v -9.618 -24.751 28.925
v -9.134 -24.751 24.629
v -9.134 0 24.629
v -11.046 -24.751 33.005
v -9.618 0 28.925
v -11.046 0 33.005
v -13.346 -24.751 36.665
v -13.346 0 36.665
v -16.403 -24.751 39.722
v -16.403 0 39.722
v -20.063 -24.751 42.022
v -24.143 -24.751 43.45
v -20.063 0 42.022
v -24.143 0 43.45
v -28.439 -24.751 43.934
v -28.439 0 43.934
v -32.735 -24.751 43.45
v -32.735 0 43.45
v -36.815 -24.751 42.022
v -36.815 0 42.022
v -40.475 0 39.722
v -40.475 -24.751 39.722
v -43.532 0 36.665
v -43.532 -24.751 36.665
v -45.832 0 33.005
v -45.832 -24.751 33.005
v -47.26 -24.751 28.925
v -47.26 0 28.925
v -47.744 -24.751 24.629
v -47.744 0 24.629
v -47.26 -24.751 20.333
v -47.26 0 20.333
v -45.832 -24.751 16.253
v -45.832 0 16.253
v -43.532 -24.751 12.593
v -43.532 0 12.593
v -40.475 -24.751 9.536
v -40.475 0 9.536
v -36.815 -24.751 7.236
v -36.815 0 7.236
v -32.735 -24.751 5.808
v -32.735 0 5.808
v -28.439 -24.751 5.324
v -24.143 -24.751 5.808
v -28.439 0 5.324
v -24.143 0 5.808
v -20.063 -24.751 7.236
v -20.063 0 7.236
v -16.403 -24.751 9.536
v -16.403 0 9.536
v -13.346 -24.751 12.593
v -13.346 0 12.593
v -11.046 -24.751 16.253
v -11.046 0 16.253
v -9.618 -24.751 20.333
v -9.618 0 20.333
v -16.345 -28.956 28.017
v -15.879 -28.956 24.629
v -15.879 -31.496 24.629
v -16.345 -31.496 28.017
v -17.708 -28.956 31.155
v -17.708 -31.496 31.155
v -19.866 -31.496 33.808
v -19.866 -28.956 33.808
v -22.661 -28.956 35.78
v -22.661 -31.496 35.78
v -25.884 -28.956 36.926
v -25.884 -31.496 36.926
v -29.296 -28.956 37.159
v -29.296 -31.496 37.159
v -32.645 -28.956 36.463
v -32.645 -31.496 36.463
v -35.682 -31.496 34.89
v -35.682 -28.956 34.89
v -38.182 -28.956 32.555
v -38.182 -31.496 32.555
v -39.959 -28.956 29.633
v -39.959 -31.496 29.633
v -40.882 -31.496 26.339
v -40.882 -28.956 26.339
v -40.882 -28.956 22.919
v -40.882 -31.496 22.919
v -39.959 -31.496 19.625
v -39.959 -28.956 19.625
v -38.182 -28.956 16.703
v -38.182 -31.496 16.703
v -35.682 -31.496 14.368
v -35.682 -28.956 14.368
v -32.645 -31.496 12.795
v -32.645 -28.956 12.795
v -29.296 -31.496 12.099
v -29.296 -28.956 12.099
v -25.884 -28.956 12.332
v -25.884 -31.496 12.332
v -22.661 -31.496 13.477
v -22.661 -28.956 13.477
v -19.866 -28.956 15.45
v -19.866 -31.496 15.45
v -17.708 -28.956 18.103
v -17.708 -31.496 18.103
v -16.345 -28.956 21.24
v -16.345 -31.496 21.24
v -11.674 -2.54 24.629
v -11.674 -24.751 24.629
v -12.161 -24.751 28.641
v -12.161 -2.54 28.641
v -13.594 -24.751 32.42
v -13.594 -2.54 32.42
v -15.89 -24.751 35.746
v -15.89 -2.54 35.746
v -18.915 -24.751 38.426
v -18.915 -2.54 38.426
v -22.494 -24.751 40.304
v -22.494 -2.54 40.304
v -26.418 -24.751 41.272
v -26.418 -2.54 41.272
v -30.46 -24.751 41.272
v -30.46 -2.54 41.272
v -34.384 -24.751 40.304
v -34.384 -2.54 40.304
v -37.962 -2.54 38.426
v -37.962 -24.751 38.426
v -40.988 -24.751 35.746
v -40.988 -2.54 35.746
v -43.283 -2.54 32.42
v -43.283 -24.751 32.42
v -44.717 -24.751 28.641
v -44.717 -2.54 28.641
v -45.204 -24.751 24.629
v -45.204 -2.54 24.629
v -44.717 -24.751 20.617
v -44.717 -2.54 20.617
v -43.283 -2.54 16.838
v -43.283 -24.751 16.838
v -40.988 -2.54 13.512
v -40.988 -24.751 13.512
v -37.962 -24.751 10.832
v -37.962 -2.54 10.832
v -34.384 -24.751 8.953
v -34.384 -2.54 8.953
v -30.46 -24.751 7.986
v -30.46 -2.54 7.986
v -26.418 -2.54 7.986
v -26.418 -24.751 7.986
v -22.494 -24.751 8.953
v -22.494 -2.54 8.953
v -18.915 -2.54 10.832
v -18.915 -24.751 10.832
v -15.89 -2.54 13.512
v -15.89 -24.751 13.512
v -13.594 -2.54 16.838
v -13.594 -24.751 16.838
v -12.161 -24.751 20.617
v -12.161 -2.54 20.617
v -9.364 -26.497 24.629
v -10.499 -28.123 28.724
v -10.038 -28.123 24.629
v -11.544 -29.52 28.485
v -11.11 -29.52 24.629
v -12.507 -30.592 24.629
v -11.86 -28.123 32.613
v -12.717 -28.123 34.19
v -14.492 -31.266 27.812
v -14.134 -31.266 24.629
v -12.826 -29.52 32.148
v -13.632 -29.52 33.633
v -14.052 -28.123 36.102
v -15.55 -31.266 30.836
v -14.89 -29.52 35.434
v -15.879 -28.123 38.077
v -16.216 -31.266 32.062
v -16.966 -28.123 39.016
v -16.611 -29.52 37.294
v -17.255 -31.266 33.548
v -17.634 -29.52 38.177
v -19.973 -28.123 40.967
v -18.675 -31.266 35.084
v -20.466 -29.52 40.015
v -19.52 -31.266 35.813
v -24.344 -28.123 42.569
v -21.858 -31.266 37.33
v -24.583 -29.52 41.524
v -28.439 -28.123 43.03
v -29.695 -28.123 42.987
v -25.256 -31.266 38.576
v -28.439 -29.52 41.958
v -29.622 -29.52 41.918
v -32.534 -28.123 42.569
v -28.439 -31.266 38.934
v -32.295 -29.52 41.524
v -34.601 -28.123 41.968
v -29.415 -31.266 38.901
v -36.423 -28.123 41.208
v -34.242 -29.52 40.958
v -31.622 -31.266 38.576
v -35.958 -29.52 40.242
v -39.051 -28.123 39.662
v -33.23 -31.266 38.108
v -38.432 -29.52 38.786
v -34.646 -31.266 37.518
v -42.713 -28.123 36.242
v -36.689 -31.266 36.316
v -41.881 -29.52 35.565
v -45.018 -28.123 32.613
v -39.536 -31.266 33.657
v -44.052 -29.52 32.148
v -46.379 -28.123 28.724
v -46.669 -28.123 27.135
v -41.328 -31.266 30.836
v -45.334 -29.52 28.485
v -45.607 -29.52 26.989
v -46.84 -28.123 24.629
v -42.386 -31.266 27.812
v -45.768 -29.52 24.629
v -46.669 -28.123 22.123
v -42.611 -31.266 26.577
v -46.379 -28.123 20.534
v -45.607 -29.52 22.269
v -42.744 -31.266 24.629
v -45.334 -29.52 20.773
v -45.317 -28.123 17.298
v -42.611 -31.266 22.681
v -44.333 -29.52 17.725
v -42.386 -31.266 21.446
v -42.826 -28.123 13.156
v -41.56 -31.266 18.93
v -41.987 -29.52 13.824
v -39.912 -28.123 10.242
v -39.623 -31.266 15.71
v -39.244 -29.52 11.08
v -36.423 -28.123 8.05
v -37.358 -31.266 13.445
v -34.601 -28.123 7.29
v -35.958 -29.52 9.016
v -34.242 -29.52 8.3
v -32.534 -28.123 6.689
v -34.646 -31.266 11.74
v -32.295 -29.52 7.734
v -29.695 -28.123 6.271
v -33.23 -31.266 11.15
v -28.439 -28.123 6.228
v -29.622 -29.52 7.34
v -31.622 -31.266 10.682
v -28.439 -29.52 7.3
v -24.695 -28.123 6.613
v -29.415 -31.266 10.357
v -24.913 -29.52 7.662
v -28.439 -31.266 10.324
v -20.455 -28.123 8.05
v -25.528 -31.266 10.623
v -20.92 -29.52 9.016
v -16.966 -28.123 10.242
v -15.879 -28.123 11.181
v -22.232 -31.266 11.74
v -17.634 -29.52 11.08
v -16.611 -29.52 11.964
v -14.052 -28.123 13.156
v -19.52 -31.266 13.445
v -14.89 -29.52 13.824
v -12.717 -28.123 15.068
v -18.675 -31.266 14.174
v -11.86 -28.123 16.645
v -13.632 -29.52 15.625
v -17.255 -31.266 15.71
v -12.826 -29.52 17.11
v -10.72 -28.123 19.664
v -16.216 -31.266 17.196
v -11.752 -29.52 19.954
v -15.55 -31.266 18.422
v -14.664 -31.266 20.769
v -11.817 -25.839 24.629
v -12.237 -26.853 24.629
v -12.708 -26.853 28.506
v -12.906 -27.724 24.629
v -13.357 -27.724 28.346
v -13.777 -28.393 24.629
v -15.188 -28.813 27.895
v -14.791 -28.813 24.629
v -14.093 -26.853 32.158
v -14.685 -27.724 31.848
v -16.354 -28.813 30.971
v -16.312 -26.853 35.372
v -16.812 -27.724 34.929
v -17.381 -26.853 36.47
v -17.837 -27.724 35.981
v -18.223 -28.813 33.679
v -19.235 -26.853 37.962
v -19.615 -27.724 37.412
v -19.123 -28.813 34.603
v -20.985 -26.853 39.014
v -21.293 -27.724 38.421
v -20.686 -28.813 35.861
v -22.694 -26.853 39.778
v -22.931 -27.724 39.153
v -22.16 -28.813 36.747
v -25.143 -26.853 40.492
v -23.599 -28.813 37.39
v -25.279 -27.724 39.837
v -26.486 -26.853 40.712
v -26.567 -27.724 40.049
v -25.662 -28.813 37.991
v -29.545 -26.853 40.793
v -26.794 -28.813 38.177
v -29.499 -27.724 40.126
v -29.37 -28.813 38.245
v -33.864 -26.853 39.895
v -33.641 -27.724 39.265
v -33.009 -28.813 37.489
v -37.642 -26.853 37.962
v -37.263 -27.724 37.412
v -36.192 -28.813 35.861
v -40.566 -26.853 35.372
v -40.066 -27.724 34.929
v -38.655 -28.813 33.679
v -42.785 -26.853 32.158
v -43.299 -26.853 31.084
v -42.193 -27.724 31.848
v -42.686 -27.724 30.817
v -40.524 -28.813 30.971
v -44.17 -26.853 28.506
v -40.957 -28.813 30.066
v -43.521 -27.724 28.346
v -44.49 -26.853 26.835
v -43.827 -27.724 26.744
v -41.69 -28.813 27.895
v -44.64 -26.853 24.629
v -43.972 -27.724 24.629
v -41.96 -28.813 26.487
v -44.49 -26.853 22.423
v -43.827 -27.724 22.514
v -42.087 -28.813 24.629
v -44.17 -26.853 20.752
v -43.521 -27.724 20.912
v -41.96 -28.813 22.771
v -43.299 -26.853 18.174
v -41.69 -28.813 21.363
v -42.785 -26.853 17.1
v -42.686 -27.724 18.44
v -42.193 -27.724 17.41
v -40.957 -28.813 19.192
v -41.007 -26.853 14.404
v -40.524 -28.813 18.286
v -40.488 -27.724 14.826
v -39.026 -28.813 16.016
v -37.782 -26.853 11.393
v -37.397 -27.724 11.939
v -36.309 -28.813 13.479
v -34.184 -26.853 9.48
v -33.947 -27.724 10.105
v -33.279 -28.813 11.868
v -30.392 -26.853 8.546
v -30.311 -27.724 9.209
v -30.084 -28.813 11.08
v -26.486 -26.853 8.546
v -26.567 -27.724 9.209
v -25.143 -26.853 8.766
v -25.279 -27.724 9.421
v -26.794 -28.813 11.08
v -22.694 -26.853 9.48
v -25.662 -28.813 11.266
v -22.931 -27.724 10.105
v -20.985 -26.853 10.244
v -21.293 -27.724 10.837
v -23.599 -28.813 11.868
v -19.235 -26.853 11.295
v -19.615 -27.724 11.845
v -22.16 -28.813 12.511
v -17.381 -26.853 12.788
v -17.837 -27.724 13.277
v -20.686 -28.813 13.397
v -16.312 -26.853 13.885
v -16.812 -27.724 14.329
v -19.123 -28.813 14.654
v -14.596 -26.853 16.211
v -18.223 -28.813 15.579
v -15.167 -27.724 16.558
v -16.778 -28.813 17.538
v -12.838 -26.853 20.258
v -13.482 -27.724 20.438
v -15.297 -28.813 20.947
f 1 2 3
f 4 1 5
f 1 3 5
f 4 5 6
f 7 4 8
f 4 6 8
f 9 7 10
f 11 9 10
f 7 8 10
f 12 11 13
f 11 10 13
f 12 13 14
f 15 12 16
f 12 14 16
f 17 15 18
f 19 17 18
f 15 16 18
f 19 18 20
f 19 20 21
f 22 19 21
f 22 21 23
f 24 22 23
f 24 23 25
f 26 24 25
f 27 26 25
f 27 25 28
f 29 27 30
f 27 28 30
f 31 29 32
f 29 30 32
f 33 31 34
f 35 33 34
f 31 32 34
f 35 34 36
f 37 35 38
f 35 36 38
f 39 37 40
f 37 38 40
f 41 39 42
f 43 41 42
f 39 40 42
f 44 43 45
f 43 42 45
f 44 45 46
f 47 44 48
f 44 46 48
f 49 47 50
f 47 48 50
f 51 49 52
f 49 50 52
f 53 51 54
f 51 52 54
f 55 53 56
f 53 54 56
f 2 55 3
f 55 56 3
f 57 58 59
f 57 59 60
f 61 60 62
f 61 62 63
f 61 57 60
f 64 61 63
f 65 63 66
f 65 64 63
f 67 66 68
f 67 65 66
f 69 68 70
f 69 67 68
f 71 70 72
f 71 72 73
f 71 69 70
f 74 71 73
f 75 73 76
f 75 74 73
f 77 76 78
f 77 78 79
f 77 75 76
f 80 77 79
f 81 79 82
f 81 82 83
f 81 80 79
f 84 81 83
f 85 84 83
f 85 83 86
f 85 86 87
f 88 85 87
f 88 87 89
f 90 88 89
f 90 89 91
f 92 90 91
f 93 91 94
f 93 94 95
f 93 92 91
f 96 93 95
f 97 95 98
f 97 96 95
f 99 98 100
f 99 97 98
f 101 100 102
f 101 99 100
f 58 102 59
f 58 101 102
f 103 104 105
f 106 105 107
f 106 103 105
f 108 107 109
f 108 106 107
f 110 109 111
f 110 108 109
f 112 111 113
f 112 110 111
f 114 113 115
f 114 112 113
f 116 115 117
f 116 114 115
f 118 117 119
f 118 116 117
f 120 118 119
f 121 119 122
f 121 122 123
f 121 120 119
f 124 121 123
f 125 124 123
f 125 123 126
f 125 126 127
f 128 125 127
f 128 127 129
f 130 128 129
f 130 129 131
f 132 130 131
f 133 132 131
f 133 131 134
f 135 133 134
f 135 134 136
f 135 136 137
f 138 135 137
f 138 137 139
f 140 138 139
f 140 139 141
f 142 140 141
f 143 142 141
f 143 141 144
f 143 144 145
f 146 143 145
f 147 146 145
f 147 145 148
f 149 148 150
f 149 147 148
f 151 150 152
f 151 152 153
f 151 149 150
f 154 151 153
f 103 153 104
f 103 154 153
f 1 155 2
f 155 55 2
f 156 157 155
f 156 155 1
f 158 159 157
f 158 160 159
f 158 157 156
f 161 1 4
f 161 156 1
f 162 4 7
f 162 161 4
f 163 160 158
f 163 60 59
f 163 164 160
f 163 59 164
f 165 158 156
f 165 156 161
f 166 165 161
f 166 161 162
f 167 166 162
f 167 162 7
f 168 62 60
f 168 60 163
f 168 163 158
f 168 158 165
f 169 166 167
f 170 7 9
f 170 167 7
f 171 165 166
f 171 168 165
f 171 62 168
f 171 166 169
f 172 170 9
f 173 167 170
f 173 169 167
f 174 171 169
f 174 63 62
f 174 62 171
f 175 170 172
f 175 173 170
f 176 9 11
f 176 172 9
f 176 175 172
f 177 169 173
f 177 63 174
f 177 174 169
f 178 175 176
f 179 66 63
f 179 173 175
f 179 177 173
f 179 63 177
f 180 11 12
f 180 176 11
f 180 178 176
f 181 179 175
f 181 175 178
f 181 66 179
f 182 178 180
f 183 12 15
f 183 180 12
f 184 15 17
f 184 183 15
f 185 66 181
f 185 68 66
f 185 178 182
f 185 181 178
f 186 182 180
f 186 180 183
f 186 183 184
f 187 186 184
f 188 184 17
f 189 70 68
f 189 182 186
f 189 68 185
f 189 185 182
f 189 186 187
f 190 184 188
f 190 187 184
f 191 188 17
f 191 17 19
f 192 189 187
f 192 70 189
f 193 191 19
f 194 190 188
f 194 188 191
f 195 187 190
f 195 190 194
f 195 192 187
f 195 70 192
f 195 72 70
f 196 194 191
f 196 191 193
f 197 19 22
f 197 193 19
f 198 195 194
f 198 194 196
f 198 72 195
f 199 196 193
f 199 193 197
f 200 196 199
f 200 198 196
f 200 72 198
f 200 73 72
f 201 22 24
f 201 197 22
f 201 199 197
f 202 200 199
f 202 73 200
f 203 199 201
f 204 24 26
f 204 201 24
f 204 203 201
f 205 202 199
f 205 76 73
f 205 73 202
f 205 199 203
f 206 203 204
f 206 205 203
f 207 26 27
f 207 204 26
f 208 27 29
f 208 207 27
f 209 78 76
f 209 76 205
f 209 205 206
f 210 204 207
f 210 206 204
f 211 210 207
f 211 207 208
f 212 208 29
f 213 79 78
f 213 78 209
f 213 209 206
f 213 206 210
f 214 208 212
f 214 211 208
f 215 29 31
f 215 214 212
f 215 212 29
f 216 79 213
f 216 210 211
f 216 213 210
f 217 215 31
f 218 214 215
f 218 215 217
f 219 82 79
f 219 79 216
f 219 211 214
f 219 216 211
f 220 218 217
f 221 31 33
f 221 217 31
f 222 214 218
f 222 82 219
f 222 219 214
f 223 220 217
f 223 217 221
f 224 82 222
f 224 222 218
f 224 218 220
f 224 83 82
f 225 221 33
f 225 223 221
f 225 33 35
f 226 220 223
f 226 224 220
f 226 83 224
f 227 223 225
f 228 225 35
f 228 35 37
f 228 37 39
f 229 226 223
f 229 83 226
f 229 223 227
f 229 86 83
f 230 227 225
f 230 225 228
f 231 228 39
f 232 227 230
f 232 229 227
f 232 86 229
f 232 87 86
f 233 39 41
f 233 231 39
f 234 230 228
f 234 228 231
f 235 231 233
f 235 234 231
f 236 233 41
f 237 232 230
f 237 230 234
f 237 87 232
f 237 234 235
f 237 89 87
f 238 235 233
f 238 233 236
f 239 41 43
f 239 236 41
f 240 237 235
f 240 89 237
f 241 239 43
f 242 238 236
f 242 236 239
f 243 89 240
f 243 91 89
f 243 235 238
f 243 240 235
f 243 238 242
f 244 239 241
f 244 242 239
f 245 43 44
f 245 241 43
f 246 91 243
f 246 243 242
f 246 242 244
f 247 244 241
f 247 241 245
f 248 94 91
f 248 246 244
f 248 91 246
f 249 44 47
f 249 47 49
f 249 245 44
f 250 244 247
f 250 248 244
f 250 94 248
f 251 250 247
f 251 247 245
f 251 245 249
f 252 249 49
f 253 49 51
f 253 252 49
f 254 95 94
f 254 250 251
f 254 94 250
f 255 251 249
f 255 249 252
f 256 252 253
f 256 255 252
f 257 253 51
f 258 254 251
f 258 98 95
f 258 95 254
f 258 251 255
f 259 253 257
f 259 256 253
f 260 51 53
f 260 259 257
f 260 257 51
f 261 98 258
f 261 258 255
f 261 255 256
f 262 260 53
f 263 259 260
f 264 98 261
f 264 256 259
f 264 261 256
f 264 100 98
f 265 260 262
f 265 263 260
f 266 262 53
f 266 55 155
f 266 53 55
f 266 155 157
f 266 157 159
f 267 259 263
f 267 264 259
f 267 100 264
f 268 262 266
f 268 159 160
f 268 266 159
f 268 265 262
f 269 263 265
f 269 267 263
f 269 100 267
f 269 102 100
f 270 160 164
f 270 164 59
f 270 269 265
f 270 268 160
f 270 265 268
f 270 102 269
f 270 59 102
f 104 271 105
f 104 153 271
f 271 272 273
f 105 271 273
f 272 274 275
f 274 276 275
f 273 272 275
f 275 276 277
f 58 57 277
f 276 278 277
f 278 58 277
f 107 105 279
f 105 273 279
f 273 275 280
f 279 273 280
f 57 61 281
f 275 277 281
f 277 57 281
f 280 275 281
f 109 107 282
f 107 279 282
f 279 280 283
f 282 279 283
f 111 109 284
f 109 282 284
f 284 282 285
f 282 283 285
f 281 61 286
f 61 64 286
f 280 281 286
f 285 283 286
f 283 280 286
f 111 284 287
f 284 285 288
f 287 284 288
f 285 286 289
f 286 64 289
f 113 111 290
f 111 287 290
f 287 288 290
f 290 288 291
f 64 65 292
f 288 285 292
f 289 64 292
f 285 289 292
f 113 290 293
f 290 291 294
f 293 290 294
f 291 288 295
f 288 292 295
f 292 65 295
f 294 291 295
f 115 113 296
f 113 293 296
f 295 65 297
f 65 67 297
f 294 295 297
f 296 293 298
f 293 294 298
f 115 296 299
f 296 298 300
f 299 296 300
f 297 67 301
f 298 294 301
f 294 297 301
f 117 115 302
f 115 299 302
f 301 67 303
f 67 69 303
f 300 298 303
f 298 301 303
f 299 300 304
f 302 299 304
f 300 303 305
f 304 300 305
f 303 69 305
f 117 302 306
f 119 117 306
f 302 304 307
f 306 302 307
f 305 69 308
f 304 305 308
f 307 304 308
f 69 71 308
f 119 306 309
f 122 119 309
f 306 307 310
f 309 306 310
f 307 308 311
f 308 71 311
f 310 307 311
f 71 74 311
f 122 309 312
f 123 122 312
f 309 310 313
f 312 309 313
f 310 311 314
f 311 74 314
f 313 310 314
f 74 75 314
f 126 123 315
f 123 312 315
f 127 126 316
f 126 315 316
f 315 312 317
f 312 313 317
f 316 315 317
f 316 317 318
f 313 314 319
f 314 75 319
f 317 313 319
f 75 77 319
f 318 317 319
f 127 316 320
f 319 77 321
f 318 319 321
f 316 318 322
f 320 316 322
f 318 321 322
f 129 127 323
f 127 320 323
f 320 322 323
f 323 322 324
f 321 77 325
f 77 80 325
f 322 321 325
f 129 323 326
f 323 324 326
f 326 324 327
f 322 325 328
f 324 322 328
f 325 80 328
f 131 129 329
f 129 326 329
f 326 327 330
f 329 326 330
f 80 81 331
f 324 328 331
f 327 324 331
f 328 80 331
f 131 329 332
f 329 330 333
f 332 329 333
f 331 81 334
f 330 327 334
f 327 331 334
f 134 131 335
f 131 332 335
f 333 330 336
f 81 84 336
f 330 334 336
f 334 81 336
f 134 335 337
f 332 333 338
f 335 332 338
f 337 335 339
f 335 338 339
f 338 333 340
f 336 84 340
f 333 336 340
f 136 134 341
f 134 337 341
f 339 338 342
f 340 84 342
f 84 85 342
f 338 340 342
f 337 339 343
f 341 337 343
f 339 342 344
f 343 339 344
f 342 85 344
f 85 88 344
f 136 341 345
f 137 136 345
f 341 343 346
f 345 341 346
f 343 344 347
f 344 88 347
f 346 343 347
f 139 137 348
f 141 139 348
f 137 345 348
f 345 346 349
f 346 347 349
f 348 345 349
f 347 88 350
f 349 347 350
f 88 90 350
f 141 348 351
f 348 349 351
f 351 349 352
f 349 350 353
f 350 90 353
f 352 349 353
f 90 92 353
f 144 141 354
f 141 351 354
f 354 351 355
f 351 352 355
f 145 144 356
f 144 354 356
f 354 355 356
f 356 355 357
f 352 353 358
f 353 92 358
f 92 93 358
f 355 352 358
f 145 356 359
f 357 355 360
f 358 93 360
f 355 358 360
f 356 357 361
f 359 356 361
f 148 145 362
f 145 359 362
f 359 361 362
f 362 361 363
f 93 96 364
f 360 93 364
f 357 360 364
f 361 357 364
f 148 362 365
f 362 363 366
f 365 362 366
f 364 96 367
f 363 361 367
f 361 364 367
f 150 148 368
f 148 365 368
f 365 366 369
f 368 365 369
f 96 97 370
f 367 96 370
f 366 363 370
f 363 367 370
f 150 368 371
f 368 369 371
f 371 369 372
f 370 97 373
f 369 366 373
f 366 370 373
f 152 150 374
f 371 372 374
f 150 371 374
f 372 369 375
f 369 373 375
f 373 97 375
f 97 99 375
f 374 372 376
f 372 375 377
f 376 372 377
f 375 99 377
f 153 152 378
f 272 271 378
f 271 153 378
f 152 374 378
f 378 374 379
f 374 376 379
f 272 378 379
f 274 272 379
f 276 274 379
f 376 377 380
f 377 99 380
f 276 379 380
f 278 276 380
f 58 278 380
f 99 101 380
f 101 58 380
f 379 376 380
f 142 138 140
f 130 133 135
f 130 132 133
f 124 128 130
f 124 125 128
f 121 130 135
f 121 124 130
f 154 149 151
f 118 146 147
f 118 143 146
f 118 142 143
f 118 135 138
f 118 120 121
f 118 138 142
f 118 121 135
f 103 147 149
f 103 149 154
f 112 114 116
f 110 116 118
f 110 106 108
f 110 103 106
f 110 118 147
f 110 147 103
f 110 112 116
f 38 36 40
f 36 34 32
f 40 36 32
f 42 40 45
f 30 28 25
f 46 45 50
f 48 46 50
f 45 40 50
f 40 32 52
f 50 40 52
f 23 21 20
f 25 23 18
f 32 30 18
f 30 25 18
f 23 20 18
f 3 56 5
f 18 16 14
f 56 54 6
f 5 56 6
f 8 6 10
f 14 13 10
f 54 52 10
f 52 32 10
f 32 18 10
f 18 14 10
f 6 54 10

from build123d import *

# Parameters (mm, degrees)
F0_R     = 19.304886182
F1_DEPTH = 31.496
F2_R     = 6.7453126933
F3_T     = -2.54


# Not quite as in the source:
# - a shell that OpenCascade refuses in one call is made with other operations: the cavity is built on its own and cut out


with BuildPart() as f1:
    # F0 (on Front) → F1 (new body)
    with BuildSketch(Plane.XZ):
        with Locations((-28.4389294684, 24.6289279312)):
            Circle(F0_R)
    extrude(amount=F1_DEPTH)

    # F2
    f2_edges = [f1.edges().sort_by_distance(p)[0] for p in [
        (-47.743816, -31.496, 24.628928),
    ]]
    fillet(f2_edges, radius=F2_R)

    # F3: a shell. OpenCascade refuses it in one call, so the cavity is built on its own and cut out:
    # the body offset inwards by the wall thickness, plus a prism from it out through each open face.
    f3_core = offset(f1.part, amount=F3_T, mode=Mode.PRIVATE)
    f3_exits = [f3_core.faces().sort_by_distance(p)[0] for p in [
        (-28.438929, -28.956, 24.628928),
    ]]
    add(f3_core, mode=Mode.SUBTRACT)
    extrude(f3_exits, amount=-F3_T, mode=Mode.SUBTRACT)


solid = f1.part
